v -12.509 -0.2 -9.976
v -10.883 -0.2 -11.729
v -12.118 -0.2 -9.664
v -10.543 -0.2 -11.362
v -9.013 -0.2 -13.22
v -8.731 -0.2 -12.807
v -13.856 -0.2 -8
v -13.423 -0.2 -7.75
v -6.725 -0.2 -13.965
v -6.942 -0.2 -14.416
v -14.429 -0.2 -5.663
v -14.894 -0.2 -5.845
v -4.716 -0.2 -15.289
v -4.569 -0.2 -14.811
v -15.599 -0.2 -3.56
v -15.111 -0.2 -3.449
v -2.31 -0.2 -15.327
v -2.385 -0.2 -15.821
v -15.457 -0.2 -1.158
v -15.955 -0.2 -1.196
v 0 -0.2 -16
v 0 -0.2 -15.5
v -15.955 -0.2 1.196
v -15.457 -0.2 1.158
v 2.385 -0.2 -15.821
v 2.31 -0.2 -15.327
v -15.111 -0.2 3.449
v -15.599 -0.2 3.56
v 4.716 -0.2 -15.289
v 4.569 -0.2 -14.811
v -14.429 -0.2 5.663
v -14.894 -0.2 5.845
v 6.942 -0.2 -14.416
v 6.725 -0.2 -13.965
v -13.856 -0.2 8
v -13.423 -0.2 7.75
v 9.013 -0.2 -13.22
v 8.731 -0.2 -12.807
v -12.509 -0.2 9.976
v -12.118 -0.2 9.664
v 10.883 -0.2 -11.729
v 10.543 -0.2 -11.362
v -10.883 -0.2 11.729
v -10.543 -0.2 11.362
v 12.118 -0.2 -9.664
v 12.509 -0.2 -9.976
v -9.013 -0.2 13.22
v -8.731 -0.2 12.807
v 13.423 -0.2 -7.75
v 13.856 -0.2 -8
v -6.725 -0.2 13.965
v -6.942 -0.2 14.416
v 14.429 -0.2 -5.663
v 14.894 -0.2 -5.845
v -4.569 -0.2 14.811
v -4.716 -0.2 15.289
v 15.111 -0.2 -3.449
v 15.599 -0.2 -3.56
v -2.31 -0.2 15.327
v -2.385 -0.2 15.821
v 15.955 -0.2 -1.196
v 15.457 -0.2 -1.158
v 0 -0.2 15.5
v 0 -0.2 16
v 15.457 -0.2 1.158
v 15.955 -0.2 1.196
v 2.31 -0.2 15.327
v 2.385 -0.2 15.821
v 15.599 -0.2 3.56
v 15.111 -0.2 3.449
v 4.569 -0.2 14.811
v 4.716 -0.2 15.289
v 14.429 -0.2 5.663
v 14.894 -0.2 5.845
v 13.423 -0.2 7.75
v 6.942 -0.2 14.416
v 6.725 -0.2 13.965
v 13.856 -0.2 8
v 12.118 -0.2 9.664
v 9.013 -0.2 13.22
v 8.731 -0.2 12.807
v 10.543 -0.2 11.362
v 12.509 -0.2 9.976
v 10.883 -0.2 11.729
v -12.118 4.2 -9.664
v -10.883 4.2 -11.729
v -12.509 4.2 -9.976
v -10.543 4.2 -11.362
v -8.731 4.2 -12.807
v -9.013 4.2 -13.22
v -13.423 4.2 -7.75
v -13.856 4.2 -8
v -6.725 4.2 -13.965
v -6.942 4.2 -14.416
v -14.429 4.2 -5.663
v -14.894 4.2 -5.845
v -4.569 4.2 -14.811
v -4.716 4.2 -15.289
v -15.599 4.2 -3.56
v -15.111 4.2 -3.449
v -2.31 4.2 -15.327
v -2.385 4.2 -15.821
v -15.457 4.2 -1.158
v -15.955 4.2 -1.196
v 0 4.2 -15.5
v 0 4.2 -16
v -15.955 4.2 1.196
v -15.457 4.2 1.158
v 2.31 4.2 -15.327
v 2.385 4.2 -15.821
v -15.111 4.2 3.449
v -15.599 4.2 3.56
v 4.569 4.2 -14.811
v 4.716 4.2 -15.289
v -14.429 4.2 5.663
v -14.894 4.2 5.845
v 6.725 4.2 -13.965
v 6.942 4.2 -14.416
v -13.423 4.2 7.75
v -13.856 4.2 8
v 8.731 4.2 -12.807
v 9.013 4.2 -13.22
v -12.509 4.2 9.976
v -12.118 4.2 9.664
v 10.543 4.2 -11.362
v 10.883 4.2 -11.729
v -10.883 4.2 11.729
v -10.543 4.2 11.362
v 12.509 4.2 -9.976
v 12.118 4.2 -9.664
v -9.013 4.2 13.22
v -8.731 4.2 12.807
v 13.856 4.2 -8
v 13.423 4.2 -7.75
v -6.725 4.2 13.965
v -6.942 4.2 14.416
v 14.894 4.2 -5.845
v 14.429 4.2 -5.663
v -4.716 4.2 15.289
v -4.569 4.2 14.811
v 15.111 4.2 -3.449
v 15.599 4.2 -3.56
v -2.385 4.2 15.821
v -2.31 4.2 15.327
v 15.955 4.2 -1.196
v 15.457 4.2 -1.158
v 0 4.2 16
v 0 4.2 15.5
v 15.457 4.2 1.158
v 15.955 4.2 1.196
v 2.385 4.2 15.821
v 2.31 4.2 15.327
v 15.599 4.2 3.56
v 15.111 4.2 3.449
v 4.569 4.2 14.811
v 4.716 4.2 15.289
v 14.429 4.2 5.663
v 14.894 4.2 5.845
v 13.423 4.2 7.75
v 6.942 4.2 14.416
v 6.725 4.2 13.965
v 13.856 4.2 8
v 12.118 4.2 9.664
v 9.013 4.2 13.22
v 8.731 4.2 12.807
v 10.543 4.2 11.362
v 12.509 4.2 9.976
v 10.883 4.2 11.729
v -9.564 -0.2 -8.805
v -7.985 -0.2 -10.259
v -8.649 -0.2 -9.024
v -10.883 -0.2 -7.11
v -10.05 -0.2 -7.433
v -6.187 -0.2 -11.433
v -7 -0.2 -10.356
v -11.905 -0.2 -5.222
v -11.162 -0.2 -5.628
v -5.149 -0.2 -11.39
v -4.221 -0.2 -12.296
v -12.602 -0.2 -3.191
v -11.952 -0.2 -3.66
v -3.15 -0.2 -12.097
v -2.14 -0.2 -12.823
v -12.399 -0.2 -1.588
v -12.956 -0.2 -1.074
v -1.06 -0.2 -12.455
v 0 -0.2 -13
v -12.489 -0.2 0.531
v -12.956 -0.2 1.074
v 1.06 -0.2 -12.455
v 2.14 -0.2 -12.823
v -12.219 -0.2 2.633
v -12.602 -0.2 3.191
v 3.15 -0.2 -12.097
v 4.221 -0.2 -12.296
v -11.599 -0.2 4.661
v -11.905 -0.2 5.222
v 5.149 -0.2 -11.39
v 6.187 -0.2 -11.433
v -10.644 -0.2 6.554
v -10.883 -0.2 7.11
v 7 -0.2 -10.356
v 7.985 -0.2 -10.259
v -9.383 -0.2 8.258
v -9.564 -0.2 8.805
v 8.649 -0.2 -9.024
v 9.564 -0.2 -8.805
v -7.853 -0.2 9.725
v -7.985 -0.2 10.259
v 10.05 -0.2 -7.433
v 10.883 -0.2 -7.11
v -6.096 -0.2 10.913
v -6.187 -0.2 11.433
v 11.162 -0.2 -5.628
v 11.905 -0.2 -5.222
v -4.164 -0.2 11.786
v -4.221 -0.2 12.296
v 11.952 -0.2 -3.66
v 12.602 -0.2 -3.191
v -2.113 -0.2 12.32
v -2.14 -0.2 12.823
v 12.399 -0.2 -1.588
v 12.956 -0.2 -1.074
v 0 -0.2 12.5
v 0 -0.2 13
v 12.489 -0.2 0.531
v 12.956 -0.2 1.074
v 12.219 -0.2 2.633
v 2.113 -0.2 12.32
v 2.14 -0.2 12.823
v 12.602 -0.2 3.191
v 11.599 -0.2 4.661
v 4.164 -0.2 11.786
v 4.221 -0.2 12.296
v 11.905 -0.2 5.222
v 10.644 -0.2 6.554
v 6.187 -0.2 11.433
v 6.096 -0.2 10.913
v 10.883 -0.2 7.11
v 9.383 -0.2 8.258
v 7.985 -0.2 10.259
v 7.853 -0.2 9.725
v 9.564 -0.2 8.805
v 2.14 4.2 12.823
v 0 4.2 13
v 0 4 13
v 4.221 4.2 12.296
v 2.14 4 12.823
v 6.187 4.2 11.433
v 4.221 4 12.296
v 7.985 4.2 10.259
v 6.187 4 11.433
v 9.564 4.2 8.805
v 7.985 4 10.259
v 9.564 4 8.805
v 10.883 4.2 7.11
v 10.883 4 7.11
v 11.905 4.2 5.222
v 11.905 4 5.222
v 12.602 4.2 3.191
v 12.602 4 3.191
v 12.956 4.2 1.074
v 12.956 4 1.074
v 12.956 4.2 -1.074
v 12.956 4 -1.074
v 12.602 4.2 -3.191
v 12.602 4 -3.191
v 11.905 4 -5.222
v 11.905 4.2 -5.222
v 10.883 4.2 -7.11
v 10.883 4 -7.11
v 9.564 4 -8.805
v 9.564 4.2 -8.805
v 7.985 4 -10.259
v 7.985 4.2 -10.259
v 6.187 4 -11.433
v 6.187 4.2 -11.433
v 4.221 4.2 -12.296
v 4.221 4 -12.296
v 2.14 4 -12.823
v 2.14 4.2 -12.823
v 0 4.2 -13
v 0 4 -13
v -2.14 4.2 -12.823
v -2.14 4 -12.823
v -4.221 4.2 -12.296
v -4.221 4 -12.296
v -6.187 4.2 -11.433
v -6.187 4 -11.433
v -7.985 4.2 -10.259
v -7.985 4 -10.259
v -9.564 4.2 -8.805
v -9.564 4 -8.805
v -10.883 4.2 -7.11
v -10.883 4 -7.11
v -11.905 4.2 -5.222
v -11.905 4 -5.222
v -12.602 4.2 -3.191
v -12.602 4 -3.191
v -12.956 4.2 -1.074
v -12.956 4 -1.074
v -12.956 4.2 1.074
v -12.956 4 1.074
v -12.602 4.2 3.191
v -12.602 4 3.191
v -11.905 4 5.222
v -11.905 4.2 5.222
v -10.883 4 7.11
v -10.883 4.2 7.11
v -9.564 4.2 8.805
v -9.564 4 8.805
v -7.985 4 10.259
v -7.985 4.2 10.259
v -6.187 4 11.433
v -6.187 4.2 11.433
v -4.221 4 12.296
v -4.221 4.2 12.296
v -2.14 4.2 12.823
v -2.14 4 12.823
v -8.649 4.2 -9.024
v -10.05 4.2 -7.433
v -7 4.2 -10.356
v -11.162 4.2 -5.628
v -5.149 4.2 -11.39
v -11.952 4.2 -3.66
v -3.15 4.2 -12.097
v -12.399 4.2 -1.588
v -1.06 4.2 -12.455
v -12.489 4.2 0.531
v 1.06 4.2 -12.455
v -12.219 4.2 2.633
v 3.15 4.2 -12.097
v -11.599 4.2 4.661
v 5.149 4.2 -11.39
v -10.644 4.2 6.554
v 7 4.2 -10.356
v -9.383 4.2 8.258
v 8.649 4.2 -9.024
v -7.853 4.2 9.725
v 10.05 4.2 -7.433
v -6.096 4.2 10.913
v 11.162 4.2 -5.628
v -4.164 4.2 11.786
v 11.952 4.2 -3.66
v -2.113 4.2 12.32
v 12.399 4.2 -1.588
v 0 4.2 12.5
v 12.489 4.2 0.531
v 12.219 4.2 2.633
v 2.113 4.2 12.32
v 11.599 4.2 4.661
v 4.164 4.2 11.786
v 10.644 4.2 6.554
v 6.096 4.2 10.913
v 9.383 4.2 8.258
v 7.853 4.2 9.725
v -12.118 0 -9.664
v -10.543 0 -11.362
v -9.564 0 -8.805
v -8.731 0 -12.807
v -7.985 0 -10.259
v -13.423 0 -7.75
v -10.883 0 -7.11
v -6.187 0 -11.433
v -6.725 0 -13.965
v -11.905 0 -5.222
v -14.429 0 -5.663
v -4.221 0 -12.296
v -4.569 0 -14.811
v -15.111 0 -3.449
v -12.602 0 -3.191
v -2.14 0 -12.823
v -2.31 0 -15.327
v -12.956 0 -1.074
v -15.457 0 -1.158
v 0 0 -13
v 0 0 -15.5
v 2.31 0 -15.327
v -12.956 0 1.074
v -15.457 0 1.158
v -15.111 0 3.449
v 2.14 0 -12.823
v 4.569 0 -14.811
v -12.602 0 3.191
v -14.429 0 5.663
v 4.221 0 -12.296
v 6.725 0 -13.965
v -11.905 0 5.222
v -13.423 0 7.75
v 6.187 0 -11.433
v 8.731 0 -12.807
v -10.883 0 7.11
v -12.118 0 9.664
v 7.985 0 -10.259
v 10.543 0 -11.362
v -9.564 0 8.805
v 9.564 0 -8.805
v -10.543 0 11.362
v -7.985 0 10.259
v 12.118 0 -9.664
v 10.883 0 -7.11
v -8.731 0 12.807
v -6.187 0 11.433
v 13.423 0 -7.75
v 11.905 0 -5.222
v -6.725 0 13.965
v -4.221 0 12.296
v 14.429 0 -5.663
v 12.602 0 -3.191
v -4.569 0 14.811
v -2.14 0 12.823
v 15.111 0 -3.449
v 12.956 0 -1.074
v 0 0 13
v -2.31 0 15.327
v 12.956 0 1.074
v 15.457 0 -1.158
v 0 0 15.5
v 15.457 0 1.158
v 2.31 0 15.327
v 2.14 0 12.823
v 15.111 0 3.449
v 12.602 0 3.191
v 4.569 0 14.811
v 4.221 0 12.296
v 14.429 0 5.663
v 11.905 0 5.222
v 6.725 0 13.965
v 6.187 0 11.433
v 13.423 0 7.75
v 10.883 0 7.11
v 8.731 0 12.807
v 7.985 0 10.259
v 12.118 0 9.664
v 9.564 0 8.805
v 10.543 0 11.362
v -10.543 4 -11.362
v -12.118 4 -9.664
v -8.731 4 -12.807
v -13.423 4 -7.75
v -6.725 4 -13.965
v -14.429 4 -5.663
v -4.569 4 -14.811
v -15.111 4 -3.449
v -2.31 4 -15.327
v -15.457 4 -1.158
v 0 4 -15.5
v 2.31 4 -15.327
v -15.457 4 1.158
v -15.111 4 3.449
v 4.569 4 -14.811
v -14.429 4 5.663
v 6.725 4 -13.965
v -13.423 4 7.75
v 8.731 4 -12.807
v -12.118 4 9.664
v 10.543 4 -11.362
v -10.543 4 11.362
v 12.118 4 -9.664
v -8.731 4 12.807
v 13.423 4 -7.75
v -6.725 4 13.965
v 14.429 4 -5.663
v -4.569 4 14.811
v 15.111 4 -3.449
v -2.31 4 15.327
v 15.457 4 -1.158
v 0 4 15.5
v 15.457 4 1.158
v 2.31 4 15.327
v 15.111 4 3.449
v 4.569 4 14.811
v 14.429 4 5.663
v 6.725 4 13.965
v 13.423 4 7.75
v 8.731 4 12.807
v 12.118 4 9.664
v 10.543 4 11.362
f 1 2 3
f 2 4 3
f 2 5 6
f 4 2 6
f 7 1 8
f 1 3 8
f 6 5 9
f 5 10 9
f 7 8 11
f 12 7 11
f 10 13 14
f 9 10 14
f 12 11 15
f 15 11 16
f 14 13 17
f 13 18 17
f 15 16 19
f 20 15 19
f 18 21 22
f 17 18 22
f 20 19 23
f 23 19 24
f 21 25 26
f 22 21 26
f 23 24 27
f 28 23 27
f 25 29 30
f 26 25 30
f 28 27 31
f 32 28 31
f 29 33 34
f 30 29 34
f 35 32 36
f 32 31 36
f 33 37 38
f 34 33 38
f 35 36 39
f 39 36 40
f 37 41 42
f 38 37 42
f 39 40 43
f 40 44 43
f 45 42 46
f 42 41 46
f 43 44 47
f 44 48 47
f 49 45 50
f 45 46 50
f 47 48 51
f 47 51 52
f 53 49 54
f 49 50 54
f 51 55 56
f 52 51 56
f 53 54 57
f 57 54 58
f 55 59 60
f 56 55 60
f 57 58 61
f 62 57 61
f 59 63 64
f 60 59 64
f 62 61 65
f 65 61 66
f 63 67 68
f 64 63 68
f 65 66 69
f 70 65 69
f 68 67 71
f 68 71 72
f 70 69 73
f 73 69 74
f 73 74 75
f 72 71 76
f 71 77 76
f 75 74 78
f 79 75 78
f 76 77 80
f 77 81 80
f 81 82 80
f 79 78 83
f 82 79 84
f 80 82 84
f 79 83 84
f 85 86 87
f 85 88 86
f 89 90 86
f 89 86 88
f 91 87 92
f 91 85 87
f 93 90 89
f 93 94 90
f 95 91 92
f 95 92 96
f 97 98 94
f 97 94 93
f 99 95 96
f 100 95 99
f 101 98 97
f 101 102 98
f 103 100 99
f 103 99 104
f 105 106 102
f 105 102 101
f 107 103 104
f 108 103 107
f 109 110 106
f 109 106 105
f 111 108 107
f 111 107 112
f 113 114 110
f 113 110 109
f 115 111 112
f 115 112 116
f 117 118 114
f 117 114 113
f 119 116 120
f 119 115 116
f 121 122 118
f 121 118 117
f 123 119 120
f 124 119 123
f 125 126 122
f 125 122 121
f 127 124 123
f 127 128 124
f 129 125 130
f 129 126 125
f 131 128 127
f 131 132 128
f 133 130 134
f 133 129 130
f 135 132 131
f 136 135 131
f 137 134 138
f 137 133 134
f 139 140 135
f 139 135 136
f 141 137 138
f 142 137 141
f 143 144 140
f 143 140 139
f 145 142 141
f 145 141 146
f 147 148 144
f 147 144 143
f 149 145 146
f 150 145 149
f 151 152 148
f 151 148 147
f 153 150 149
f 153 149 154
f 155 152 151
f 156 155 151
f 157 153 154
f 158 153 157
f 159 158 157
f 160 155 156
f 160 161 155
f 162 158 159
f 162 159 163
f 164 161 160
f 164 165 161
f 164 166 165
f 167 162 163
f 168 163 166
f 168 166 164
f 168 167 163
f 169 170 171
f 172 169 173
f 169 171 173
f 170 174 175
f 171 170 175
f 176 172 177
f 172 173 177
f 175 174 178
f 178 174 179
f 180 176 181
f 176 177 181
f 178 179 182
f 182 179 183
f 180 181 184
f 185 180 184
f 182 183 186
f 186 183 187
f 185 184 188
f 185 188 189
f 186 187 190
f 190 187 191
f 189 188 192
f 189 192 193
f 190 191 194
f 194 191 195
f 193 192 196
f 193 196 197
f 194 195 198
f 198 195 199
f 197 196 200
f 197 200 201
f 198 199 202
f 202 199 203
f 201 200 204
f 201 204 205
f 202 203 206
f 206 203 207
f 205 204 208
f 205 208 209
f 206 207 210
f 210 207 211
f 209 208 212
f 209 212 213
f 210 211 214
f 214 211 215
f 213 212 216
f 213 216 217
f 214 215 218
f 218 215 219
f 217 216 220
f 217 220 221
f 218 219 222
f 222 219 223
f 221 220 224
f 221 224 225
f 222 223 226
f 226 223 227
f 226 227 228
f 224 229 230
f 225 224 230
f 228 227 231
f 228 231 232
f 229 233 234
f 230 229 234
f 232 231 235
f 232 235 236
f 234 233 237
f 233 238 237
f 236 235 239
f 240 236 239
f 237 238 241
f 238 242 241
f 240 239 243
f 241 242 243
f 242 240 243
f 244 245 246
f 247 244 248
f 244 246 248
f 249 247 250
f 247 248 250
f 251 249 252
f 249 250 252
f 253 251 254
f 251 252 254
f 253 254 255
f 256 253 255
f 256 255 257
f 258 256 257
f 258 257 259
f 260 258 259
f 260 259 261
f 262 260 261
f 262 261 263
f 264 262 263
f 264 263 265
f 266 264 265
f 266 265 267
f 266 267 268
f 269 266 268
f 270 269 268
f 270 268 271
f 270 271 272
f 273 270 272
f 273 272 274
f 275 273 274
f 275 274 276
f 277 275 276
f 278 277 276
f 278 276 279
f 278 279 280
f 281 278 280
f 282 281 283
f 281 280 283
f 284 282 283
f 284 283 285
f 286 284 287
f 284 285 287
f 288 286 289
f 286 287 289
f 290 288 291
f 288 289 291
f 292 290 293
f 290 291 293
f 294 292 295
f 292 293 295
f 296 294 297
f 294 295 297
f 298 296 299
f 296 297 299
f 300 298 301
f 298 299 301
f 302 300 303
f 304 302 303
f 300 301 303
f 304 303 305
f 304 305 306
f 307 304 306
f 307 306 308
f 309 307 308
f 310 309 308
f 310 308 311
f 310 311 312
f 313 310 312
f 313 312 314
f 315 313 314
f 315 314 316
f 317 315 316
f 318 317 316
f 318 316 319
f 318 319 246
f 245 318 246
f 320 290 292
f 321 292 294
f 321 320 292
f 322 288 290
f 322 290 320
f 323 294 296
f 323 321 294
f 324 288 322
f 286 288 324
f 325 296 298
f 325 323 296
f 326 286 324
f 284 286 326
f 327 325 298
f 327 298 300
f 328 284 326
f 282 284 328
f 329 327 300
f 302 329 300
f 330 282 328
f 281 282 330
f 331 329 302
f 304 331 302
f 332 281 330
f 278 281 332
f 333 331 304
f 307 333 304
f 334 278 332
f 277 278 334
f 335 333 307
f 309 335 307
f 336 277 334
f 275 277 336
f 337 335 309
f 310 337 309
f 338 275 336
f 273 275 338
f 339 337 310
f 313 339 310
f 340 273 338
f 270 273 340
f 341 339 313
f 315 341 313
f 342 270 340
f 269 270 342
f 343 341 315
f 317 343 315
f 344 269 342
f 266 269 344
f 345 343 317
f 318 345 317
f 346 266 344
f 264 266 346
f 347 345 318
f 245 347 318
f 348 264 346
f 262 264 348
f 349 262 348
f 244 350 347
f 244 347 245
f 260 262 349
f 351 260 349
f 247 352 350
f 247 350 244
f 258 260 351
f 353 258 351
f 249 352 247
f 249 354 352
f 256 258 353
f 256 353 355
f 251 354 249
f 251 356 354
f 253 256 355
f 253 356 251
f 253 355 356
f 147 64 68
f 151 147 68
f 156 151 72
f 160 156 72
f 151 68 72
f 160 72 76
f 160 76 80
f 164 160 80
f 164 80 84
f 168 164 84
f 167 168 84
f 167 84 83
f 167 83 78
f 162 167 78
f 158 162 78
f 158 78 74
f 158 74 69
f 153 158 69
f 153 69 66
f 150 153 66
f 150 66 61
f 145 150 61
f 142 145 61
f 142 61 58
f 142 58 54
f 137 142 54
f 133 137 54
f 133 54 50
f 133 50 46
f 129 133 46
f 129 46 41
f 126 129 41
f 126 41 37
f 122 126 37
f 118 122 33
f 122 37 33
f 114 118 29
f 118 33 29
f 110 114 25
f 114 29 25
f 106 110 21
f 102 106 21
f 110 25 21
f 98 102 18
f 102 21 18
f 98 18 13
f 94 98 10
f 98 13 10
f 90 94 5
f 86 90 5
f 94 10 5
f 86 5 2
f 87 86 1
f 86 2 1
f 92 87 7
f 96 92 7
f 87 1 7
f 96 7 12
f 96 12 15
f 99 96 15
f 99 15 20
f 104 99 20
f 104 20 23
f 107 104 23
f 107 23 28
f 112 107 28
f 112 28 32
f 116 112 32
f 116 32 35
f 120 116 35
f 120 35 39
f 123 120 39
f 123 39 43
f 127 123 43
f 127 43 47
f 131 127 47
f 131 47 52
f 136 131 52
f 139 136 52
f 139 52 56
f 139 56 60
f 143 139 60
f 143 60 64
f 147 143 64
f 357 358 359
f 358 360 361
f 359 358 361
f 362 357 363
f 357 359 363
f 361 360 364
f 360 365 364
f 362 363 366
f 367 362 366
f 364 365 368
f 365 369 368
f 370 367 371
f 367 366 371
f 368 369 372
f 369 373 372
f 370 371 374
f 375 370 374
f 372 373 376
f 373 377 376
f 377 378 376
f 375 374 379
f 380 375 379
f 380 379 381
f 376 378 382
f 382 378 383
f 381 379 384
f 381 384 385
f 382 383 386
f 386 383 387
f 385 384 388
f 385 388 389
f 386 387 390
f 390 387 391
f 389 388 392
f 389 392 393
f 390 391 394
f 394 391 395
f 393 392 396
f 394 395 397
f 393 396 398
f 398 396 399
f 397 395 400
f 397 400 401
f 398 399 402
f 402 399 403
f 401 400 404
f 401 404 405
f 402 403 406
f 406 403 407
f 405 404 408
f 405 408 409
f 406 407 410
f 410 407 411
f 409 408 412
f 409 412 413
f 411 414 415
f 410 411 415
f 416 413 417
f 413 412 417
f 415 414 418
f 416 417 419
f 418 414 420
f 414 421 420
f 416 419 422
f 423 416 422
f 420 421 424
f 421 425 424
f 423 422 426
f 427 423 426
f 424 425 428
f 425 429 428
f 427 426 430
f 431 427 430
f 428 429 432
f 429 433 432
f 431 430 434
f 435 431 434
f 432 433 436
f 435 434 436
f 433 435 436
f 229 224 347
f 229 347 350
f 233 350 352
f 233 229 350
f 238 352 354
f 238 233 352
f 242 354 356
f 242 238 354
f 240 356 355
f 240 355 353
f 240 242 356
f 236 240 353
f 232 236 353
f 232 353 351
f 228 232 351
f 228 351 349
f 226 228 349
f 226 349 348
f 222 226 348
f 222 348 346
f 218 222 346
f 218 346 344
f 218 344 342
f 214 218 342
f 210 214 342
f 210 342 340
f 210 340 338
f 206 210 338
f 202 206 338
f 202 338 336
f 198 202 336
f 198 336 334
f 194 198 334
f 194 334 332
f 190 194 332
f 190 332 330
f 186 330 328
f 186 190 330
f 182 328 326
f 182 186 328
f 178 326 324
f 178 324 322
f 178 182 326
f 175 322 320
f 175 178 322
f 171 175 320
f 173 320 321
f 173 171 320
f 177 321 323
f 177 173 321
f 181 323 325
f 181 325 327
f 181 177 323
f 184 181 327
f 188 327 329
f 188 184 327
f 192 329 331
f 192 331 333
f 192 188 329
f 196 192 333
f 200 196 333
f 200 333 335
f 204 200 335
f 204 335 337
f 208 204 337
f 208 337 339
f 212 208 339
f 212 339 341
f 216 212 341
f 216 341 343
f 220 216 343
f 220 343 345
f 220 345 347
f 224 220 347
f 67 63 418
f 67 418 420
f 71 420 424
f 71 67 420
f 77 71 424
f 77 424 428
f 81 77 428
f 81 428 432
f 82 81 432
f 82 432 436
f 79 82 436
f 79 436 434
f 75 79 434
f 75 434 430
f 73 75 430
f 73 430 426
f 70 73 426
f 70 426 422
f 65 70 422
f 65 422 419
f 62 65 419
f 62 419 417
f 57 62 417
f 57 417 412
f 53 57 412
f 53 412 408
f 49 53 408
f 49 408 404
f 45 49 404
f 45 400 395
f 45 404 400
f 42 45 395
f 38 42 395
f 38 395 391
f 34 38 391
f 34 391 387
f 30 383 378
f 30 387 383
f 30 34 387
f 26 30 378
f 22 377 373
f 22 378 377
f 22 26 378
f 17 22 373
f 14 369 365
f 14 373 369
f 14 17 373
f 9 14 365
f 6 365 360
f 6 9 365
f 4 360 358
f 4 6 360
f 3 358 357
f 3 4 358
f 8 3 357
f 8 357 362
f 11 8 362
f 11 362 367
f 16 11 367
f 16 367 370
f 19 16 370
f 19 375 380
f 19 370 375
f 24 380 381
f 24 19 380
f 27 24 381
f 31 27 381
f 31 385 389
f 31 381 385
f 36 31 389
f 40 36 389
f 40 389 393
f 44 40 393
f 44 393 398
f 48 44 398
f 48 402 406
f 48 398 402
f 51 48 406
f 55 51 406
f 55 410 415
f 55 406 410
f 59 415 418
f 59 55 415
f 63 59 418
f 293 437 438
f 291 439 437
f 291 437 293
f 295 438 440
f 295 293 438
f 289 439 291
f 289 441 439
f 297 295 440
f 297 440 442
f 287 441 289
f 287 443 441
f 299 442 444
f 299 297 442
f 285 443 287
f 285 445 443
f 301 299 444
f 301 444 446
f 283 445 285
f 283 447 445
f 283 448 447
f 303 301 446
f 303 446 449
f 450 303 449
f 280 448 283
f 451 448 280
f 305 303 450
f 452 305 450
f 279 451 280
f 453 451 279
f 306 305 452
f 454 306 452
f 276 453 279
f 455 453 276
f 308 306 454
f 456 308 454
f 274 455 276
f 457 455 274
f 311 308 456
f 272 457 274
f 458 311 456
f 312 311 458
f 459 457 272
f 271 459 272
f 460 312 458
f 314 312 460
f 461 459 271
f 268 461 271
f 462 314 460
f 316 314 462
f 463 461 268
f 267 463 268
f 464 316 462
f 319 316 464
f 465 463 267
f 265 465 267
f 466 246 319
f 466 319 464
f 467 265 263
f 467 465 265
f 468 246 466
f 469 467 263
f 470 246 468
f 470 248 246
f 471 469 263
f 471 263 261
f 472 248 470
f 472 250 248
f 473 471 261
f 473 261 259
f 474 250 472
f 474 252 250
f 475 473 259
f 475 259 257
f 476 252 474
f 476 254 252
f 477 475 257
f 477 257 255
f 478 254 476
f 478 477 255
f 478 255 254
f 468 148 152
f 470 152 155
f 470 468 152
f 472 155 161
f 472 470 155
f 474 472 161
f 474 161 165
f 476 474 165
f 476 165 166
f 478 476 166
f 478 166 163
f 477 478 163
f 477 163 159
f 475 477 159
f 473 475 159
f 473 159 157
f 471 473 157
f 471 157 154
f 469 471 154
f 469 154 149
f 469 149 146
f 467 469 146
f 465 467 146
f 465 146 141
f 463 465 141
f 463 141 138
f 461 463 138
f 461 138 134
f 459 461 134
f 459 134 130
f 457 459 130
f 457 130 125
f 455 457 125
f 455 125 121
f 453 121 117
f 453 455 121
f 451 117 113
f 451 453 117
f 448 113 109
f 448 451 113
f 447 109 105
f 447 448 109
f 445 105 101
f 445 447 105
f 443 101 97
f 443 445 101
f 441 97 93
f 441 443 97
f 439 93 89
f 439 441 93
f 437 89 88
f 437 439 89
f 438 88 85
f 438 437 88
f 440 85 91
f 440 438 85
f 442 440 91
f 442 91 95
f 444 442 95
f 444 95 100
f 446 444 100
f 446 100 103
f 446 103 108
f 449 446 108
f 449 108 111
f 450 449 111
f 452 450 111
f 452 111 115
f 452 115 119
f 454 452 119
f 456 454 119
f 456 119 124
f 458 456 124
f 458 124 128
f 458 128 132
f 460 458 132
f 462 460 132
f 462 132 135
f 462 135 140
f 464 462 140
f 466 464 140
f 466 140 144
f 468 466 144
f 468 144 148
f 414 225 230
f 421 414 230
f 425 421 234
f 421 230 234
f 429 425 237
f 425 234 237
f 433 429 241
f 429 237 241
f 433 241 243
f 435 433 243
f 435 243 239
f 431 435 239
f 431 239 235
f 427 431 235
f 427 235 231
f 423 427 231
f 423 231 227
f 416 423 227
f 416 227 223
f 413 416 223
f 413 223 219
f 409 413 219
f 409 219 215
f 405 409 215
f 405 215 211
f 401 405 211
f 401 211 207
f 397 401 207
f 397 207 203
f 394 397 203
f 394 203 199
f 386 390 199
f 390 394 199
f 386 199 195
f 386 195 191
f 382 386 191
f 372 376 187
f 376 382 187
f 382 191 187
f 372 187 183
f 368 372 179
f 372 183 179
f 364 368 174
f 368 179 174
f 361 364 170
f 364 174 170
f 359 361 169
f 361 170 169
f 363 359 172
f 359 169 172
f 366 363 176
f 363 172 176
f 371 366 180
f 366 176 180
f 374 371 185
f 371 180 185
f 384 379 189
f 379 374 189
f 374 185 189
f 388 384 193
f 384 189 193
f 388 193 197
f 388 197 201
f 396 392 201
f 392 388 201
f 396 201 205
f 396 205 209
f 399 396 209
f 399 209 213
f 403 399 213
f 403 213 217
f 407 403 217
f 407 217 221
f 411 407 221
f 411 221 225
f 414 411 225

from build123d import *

# Parameters (mm, degrees)
SKETCH1_R                = 16
SKETCH1_R_2              = 12.5
BOSS_EXTRUDE1_DEPTH      = 4
BOSS_EXTRUDE2_DEPTH      = 0.2
BOSS_EXTRUDE2_DEPTH_BACK = 4.2
SKETCH2_R                = 16
SKETCH2_R_2              = 15.5
SKETCH2_R_3              = 13
SKETCH2_R_4              = 12.5


with BuildPart() as part:
    # Sketch1 → Boss-Extrude1 (new body)
    with BuildSketch(Plane(origin=(0, 0, 0), x_dir=(1, 0, 0), z_dir=(0, 1, 0))):
        with Locations(Location((0, 0, 0), (0, 0, 270))):
            Circle(SKETCH1_R)
        with Locations(Location((0, 0, 0), (0, 0, 270))):
            Circle(SKETCH1_R_2, mode=Mode.SUBTRACT)
    extrude(amount=BOSS_EXTRUDE1_DEPTH)

    # Sketch2 → Boss-Extrude2 (add, two sides: drawn at the far end of the back side and taken through both)
    # profile 1 of 2: a face of its own
    with BuildSketch(Plane(origin=(0, 4, 0), x_dir=(1, 0, 0), z_dir=(0, 1, 0)).offset(-BOSS_EXTRUDE2_DEPTH_BACK)):
        with Locations(Location((0, 0, 0), (0, 0, 270))):
            Circle(SKETCH2_R)
        with Locations(Location((0, 0, 0), (0, 0, 270))):
            Circle(SKETCH2_R_2, mode=Mode.SUBTRACT)
    # profile 2 of 2: a face of its own
    with BuildSketch(Plane(origin=(0, 4, 0), x_dir=(1, 0, 0), z_dir=(0, 1, 0)).offset(-BOSS_EXTRUDE2_DEPTH_BACK)):
        with Locations(Location((0, 0, 0), (0, 0, 270))):
            Circle(SKETCH2_R_3)
        with Locations(Location((0, 0, 0), (0, 0, 270))):
            Circle(SKETCH2_R_4, mode=Mode.SUBTRACT)
    extrude(amount=BOSS_EXTRUDE2_DEPTH + BOSS_EXTRUDE2_DEPTH_BACK)


solid = part.part
